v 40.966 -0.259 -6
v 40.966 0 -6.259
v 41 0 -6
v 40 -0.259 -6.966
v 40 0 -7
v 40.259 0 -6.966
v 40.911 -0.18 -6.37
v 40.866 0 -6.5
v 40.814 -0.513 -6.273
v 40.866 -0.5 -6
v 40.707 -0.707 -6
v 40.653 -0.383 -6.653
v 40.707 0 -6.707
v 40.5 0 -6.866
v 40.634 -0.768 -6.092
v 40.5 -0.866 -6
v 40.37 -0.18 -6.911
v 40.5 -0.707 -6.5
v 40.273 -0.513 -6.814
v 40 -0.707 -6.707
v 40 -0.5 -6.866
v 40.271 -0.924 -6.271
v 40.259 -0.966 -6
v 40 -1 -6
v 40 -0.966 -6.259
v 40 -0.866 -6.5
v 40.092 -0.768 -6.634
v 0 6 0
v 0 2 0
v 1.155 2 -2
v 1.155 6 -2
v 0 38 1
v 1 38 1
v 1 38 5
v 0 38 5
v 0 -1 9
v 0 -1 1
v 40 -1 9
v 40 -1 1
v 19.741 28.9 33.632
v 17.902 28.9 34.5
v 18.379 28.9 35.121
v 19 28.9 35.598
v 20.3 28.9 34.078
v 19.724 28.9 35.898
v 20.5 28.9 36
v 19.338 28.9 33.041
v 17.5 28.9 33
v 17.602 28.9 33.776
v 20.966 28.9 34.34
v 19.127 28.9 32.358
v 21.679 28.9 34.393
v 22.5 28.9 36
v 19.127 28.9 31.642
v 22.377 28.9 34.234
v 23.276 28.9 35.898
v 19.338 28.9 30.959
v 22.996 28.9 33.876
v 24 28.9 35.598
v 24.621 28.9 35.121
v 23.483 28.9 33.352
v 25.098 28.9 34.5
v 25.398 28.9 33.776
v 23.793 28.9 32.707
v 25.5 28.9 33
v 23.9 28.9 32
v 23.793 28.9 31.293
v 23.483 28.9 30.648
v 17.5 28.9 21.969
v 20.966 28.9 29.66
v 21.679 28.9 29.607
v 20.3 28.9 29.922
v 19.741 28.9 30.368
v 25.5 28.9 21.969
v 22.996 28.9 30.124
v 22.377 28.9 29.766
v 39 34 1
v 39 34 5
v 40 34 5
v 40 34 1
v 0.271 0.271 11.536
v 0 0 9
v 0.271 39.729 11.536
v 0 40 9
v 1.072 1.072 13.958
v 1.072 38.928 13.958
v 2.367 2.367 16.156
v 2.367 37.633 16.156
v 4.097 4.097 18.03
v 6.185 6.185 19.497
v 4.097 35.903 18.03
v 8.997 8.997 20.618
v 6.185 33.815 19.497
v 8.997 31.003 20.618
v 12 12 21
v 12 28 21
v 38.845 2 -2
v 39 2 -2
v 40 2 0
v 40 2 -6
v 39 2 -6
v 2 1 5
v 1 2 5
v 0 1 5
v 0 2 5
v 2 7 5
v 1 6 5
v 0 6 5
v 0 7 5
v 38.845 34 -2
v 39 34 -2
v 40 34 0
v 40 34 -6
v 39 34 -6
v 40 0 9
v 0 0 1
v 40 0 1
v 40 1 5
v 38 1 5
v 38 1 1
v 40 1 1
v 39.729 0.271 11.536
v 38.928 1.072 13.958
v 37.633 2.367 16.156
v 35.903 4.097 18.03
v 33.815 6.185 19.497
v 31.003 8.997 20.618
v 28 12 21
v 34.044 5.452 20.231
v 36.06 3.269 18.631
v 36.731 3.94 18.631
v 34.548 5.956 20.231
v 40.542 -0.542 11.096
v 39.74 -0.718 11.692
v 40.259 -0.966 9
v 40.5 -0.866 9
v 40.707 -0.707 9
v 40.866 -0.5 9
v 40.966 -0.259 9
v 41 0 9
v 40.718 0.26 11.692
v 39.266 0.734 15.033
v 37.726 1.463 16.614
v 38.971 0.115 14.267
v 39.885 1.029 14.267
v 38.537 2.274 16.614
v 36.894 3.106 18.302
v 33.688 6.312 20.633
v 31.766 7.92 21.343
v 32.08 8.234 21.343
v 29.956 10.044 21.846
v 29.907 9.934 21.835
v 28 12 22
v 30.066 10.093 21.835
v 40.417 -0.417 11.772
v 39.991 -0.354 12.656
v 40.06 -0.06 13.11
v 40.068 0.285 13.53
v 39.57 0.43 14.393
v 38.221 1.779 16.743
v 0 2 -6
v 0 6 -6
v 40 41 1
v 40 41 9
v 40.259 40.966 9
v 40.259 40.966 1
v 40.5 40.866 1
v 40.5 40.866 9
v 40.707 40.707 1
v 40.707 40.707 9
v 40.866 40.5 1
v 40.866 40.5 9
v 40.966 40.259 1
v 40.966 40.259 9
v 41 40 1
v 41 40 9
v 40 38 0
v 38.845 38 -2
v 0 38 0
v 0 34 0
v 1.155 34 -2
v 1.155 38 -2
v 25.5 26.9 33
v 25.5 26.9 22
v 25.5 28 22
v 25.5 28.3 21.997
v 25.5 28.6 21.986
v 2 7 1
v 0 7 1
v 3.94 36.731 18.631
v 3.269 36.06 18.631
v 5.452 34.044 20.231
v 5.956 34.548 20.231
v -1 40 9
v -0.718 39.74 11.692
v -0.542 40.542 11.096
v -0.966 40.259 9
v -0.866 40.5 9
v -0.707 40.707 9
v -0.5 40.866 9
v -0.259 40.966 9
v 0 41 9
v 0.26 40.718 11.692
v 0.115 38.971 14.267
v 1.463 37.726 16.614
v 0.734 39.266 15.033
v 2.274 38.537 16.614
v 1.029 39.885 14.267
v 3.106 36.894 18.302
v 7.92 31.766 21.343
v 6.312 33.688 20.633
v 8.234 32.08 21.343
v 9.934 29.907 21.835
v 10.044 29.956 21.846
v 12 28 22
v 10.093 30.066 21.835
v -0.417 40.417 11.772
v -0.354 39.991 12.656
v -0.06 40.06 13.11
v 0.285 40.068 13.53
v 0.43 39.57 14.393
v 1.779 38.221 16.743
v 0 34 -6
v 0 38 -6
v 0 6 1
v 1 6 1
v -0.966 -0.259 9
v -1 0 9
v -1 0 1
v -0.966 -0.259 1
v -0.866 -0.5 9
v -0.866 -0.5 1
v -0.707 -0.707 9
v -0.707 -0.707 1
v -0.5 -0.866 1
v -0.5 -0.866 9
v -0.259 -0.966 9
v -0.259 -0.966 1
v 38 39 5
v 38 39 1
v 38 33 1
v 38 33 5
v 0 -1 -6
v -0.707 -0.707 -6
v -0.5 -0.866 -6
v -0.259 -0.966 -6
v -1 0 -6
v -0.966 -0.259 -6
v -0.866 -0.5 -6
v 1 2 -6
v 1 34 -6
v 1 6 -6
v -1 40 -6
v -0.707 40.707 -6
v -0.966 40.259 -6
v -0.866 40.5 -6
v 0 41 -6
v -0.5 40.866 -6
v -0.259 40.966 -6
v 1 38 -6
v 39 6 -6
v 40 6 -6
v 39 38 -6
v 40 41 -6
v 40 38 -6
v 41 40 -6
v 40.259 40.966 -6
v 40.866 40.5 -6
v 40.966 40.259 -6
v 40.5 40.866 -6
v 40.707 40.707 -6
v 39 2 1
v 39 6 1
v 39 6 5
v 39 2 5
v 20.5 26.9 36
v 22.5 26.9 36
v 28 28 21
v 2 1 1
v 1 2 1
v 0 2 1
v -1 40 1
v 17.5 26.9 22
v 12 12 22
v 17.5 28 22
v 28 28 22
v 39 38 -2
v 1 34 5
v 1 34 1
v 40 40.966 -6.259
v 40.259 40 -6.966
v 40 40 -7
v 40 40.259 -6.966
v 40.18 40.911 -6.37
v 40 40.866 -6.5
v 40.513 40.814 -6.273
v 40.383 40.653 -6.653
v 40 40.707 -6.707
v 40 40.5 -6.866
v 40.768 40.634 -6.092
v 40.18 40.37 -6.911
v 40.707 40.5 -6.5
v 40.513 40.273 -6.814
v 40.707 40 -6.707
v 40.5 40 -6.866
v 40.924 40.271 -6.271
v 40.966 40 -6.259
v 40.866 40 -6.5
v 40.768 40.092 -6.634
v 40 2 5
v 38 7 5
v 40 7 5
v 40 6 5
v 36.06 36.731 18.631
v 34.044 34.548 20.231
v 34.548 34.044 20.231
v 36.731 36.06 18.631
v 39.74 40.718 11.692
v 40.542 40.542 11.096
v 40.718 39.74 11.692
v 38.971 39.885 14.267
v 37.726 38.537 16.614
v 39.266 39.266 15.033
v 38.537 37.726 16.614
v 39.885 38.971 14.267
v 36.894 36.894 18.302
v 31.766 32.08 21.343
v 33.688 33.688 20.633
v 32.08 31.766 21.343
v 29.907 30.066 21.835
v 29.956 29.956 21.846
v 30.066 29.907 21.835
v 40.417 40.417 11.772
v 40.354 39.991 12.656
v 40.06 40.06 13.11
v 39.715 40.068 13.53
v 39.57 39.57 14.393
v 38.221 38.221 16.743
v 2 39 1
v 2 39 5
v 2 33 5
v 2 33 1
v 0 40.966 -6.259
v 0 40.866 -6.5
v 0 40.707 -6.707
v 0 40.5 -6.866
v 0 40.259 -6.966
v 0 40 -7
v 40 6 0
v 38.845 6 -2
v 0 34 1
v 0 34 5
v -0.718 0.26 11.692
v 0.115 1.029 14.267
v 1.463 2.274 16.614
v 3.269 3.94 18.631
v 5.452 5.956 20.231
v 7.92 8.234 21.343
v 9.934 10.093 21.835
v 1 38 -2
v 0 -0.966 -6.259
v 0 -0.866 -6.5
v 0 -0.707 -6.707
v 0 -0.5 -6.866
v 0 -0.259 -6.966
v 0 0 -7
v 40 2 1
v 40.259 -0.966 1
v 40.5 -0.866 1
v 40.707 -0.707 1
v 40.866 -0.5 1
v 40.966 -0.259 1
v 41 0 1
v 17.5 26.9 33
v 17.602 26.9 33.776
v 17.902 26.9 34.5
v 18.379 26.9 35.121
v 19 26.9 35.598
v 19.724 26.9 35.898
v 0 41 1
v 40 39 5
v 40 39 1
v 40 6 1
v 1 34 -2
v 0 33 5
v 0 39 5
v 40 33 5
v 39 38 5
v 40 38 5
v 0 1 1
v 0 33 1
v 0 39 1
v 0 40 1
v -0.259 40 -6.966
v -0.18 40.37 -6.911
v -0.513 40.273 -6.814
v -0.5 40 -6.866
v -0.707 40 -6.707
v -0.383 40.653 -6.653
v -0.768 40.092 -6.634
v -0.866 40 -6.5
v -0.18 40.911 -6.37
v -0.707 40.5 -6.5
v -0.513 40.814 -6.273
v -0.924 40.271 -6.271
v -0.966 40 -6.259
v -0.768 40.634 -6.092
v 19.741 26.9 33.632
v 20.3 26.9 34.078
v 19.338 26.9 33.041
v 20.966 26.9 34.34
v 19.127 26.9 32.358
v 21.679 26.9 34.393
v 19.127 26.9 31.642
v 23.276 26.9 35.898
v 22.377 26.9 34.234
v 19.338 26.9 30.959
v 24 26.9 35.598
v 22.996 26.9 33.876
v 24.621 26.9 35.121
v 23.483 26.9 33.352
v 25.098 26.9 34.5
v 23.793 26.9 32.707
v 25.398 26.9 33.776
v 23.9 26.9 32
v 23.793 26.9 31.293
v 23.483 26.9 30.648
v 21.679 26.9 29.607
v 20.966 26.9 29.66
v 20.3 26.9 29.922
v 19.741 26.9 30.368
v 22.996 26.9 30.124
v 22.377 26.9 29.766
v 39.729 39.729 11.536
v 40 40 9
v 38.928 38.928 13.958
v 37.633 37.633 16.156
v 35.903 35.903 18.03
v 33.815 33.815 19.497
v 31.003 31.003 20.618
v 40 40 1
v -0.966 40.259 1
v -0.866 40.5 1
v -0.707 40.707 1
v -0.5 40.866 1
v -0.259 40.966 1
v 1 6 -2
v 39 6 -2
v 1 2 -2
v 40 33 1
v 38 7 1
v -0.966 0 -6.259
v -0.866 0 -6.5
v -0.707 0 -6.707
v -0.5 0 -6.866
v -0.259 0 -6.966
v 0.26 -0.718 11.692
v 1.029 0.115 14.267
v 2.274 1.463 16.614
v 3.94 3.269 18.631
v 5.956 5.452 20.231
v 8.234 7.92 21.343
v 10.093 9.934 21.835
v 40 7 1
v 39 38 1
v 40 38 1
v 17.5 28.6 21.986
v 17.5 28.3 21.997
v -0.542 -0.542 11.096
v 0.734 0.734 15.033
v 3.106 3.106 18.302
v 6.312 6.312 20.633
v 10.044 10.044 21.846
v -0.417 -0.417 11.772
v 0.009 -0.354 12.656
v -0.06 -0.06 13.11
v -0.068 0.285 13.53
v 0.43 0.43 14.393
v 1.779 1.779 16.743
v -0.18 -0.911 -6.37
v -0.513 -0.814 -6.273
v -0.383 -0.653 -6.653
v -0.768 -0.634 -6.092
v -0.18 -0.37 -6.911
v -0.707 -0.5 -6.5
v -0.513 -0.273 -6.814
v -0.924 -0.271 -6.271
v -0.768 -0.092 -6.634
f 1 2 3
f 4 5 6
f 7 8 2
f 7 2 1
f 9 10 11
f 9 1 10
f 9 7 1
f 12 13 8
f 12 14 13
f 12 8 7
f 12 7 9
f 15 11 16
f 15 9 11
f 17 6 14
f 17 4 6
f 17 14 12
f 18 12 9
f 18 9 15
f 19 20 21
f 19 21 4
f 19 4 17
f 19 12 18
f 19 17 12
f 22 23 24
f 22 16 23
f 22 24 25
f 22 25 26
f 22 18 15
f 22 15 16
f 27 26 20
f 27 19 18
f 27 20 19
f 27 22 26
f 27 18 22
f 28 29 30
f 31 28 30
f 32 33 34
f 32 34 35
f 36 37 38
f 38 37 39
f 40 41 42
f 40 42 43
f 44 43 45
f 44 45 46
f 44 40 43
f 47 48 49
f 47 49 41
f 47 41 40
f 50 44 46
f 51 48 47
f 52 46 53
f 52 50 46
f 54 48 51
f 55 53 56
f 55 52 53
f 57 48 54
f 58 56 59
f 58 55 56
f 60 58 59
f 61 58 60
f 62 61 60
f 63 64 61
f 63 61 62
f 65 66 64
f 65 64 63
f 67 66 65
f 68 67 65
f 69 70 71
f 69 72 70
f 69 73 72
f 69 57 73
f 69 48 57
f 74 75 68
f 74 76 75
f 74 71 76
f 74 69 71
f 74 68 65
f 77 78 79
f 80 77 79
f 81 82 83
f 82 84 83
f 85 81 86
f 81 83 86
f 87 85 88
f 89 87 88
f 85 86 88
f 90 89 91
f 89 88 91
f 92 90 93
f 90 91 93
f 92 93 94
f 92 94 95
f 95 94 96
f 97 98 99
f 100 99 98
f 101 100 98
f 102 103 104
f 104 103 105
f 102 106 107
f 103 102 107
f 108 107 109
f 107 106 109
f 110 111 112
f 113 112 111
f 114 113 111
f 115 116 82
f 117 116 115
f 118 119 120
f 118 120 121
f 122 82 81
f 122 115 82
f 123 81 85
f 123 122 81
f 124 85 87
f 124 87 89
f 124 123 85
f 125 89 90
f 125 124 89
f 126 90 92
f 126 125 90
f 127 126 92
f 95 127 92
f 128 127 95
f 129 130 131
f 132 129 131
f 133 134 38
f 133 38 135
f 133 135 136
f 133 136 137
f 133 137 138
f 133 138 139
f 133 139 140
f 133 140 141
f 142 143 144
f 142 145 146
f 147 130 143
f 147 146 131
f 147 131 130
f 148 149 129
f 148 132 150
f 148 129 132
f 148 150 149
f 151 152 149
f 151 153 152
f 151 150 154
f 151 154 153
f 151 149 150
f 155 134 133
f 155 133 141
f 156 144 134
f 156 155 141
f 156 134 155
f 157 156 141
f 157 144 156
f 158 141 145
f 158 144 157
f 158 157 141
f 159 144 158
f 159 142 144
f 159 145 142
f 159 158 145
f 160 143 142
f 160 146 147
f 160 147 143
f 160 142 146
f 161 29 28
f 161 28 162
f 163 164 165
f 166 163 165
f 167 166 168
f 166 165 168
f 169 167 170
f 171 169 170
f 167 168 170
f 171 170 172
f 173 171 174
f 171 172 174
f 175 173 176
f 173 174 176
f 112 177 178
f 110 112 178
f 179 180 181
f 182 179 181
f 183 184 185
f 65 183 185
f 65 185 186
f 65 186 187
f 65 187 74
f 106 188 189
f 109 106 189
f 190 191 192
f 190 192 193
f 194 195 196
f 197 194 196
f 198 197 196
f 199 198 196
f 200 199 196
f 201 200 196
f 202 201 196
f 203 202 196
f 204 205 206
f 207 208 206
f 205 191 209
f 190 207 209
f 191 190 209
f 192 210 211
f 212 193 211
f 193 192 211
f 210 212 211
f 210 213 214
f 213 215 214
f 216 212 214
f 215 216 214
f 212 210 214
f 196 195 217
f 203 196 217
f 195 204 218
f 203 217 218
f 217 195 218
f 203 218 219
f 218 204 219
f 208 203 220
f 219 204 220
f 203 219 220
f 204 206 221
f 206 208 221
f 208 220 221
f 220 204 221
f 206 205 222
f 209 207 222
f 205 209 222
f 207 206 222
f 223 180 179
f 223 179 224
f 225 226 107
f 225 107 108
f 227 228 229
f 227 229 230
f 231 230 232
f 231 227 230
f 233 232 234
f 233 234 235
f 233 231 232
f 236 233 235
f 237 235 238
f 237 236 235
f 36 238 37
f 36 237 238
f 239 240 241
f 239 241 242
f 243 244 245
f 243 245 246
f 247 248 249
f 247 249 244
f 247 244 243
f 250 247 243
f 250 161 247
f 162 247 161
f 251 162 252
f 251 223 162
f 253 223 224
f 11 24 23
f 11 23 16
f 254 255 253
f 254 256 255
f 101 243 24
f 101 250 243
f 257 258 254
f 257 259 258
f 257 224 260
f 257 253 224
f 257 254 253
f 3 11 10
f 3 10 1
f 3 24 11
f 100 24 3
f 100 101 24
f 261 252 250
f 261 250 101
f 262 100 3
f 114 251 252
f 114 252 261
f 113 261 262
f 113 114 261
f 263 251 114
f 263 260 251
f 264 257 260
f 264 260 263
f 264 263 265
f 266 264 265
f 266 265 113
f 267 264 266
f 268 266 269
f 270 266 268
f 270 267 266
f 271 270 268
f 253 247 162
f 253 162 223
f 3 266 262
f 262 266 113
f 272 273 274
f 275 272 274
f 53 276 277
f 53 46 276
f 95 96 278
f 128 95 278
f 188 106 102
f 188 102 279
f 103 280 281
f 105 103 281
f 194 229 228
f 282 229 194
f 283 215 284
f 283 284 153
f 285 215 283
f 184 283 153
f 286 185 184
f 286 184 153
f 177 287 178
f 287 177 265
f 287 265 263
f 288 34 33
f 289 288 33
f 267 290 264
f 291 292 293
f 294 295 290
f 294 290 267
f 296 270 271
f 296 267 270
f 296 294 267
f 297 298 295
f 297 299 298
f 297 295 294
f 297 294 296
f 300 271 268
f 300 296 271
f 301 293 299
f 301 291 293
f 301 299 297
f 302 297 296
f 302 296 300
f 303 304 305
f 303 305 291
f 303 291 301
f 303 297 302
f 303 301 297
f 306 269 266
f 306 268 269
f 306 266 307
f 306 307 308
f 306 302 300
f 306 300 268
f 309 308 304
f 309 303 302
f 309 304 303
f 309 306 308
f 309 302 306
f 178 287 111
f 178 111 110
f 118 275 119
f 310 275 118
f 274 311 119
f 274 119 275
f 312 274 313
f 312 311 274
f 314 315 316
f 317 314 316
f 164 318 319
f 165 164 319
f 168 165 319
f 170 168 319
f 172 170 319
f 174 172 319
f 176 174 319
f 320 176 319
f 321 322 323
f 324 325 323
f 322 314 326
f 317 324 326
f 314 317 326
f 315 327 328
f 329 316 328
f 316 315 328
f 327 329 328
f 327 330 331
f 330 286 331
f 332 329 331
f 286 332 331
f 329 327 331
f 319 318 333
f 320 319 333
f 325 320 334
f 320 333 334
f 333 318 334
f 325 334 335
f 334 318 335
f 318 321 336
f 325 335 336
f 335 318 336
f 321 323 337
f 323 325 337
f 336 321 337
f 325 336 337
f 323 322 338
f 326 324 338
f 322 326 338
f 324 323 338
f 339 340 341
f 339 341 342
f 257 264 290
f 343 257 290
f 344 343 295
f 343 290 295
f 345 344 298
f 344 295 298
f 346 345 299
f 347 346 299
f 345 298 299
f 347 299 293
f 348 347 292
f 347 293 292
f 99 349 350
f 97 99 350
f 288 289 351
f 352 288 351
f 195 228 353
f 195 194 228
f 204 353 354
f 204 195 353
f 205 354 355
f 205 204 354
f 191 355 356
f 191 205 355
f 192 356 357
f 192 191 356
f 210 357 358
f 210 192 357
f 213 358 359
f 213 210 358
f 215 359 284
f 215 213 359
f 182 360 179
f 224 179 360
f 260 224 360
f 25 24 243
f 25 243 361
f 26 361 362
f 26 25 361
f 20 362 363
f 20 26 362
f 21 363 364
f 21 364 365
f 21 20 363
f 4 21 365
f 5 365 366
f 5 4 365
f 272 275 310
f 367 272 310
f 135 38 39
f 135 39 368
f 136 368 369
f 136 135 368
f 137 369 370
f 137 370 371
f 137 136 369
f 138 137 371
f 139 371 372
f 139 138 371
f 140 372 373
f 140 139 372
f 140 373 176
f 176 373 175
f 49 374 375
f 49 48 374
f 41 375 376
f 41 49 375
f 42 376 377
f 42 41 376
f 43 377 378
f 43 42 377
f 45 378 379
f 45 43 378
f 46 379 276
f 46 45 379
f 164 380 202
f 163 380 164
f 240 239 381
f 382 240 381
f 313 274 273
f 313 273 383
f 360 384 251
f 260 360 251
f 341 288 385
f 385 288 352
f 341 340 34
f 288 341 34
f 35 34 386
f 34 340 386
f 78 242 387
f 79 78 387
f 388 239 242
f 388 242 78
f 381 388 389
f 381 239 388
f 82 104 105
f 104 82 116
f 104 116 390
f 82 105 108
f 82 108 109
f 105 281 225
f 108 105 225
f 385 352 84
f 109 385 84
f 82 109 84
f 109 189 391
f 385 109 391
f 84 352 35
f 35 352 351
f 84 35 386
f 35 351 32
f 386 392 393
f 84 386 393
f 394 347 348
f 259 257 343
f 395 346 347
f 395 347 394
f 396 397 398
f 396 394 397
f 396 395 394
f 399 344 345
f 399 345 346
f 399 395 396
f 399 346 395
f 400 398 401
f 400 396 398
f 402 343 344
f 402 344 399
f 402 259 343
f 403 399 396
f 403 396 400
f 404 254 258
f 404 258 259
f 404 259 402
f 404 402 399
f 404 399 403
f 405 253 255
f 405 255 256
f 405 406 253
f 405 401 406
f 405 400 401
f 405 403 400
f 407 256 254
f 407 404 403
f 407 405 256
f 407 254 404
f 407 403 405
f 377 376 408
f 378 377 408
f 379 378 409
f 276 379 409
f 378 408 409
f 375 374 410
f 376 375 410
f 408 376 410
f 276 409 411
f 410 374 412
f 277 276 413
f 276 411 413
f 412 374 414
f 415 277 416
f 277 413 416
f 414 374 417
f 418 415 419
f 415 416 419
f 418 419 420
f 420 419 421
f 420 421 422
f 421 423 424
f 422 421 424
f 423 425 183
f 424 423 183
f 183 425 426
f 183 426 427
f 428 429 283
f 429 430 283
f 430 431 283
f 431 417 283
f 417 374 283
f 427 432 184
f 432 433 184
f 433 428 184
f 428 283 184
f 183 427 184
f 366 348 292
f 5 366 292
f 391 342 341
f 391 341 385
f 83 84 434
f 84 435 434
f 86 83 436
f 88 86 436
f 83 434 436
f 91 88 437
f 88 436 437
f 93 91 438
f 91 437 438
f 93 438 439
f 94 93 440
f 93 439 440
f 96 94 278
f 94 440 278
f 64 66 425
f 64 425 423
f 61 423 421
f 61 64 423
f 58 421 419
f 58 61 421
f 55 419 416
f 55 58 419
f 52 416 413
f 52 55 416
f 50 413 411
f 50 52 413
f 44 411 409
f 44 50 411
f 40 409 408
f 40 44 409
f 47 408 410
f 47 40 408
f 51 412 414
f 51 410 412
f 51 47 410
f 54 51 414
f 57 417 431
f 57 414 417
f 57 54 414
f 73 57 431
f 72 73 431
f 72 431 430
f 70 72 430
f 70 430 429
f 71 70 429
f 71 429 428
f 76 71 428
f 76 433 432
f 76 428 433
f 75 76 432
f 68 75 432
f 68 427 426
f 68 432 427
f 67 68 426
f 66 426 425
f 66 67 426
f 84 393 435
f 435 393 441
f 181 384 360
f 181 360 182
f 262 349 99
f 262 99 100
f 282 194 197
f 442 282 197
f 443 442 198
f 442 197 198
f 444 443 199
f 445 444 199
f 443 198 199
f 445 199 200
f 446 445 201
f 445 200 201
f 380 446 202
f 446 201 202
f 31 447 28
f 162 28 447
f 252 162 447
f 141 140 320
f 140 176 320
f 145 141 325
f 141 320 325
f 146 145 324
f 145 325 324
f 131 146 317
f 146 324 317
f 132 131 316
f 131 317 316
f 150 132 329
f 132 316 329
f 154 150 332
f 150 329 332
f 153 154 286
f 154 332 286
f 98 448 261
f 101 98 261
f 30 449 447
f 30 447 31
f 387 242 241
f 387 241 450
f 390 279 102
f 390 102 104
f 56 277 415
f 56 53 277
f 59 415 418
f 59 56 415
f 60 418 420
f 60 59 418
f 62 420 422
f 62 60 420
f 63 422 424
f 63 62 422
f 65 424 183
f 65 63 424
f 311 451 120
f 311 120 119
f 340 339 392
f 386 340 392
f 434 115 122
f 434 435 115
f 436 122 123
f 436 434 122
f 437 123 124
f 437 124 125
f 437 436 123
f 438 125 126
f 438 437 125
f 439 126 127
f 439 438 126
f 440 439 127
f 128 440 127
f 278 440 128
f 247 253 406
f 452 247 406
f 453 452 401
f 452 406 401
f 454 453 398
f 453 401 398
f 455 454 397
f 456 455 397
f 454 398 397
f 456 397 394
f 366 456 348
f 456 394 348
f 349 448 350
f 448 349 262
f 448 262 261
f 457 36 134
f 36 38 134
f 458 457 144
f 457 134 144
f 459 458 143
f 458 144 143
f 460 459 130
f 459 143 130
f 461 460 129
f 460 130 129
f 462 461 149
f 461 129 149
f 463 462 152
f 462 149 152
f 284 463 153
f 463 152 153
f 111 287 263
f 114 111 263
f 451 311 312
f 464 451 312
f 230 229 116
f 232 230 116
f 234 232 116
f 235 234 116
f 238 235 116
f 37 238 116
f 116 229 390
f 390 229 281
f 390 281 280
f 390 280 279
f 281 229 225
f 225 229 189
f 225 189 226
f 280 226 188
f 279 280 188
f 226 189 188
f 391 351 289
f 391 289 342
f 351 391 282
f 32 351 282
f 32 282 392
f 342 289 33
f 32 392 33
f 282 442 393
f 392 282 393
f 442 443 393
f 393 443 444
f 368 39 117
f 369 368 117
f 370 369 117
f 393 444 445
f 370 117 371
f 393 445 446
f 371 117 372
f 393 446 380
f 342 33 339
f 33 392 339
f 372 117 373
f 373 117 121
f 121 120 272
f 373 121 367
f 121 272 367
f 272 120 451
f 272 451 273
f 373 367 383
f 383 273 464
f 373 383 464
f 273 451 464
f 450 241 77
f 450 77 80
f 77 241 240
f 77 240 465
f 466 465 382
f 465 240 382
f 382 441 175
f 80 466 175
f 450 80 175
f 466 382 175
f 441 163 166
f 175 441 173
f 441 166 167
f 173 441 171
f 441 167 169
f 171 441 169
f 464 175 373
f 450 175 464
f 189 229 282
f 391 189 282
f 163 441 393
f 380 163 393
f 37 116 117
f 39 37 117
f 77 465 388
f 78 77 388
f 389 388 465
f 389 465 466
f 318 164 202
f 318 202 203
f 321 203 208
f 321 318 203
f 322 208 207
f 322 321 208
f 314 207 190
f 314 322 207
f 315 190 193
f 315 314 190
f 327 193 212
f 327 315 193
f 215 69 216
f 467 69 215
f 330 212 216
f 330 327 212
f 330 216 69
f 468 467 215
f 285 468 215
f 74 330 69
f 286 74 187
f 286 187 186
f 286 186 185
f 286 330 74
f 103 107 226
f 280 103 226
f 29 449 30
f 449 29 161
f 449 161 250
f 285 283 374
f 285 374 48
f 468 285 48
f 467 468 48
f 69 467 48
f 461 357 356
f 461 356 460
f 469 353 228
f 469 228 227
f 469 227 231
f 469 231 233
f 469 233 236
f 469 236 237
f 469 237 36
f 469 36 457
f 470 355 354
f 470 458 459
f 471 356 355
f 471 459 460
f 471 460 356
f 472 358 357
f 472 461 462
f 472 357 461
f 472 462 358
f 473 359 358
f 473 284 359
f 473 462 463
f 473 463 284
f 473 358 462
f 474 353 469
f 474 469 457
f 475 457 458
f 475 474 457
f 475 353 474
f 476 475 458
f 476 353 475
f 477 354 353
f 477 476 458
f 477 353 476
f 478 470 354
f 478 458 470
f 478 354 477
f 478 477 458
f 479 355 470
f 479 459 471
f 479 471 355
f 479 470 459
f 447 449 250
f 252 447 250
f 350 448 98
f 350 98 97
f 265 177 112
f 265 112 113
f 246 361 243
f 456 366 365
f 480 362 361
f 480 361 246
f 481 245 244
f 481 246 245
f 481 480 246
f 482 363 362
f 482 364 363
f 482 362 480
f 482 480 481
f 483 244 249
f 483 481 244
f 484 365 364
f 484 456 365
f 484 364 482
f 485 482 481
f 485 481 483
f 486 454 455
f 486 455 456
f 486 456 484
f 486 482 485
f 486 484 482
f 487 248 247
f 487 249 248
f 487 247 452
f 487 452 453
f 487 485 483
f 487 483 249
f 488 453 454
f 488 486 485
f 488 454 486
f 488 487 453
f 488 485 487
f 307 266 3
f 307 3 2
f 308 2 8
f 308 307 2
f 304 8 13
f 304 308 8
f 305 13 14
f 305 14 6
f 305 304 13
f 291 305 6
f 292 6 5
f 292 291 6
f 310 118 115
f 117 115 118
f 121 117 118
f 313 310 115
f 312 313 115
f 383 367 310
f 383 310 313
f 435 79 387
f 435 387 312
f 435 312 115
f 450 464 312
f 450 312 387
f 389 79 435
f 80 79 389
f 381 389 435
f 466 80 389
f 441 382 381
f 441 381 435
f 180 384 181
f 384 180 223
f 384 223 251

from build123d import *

# Parameters (mm, degrees)
BOX056_W               = 40
BOX056_H               = 40
BOX056_DEPTH           = 20
FILLET007_R            = 12
THICKNESS008_T         = 1
BOX064_W               = 1
BOX064_H               = 4
BOX064_DEPTH           = 4
BOX063_W               = 2
BOX063_H               = 4
BOX063_DEPTH           = 6
CUT027_ROLL_ANGLE      = -90
CUT027_PLACEMENT_ANGLE = 180
BOX062_W               = 1
BOX062_H               = 4
BOX062_DEPTH           = 4
BOX061_W               = 2
BOX061_H               = 4
BOX061_DEPTH           = 6
CUT026_ROLL_ANGLE      = -90
CUT026_PLACEMENT_ANGLE = 180
BOX060_W               = 1
BOX060_H               = 4
BOX060_DEPTH           = 4
BOX059_W               = 2
BOX059_H               = 4
BOX059_DEPTH           = 6
CUT025_PLACEMENT_ANGLE = 90
BOX058_W               = 1
BOX058_H               = 4
BOX058_DEPTH           = 4
BOX057_W               = 2
BOX057_H               = 4
BOX057_DEPTH           = 6
CUT024_PLACEMENT_ANGLE = 90
CYLINDER014_R          = 2.4
CYLINDER014_DEPTH      = 10
BOX053_W               = 8
BOX053_H               = 2
BOX053_DEPTH           = 15
FILLET005_R            = 3
BOX066_W               = 2
BOX066_H               = 3
BOX066_DEPTH           = 4
BOX066_PLACEMENT_ANGLE = 30
BOX068_W               = 1.2
BOX068_H               = 2
BOX068_DEPTH           = 4
BOX067_W               = 1
BOX067_H               = 6
BOX067_DEPTH           = 4
CUT028_PLACEMENT_ANGLE = 90
BOX069_W               = 2
BOX069_H               = 3
BOX069_DEPTH           = 4
BOX069_PLACEMENT_ANGLE = 30
BOX071_W               = 1.2
BOX071_H               = 2
BOX071_DEPTH           = 4
BOX070_W               = 1
BOX070_H               = 6
BOX070_DEPTH           = 4
CUT029_PLACEMENT_ANGLE = 90
BOX072_W               = 2
BOX072_H               = 3
BOX072_DEPTH           = 4
BOX072_PLACEMENT_ANGLE = 30
BOX074_W               = 1.2
BOX074_H               = 2
BOX074_DEPTH           = 4
BOX073_W               = 1
BOX073_H               = 6
BOX073_DEPTH           = 4
CUT030_ROLL_ANGLE      = -90
CUT030_PLACEMENT_ANGLE = 180
BOX075_W               = 2
BOX075_H               = 3
BOX075_DEPTH           = 4
BOX075_PLACEMENT_ANGLE = 30
BOX077_W               = 1.2
BOX077_H               = 2
BOX077_DEPTH           = 4
BOX076_W               = 1
BOX076_H               = 6
BOX076_DEPTH           = 4
CUT031_ROLL_ANGLE      = -90
CUT031_PLACEMENT_ANGLE = 180
BOX065_W               = 40
BOX065_H               = 40
BOX065_DEPTH           = 20
THICKNESS007_T         = 1
BOX055_W               = 42
BOX055_H               = 42
BOX055_DEPTH           = 1


with BuildPart() as thickness008:
    # Box056 → Box056 (new body)
    with BuildSketch(Plane.XY):
        with Locations((20, 20)):
            Rectangle(BOX056_W, BOX056_H)
    extrude(amount=BOX056_DEPTH)

    # Fillet007
    fillet007_edges = [thickness008.edges().sort_by_distance(p)[0] for p in [
        (0, 20, 20),
        (40, 20, 20),
        (20, 0, 20),
        (20, 40, 20),
    ]]
    fillet(fillet007_edges, radius=FILLET007_R)


with BuildPart() as thickness008_1:
    # Fillet007 placement: moved
    add(thickness008.part.moved(Location((0, 0, 1))))

    # Thickness008
    thickness008_openings = [thickness008_1.faces().sort_by_distance(p)[0] for p in [
        (20, 20, 1),
    ]]
    offset(amount=THICKNESS008_T, openings=thickness008_openings)


with BuildPart() as cube045:
    # Box064 → Box064 (new body)
    with BuildSketch(Plane(origin=(1, 0, 1), x_dir=(1, 0, 0), z_dir=(0, 0, 1))):
        with Locations((0.5, 2)):
            Rectangle(BOX064_W, BOX064_H)
    extrude(amount=BOX064_DEPTH)


with BuildPart() as cut027:
    # Box063 → Box063 (new body)
    with BuildSketch(Plane.XY):
        with Locations((1, 2)):
            Rectangle(BOX063_W, BOX063_H)
    extrude(amount=BOX063_DEPTH)

    # Cut027: cut Cube045
    add(cube045.part, mode=Mode.SUBTRACT)


with BuildPart() as cut027_1:
    # Cut027 roll: moved
    add(cut027.part.rotate(Axis((0, 0, 0), (1, 0, 0)), CUT027_ROLL_ANGLE))


with BuildPart() as cut027_2:
    # Cut027 placement: moved
    add(cut027_1.part.moved(Location((2, 39, 5))).rotate(Axis((2, 39, 5), (0, 0, 1)), CUT027_PLACEMENT_ANGLE))


with BuildPart() as cube043:
    # Box062 → Box062 (new body)
    with BuildSketch(Plane(origin=(1, 0, 1), x_dir=(1, 0, 0), z_dir=(0, 0, 1))):
        with Locations((0.5, 2)):
            Rectangle(BOX062_W, BOX062_H)
    extrude(amount=BOX062_DEPTH)


with BuildPart() as cut026:
    # Box061 → Box061 (new body)
    with BuildSketch(Plane.XY):
        with Locations((1, 2)):
            Rectangle(BOX061_W, BOX061_H)
    extrude(amount=BOX061_DEPTH)

    # Cut026: cut Cube043
    add(cube043.part, mode=Mode.SUBTRACT)


with BuildPart() as cut026_1:
    # Cut026 roll: moved
    add(cut026.part.rotate(Axis((0, 0, 0), (1, 0, 0)), CUT026_ROLL_ANGLE))


with BuildPart() as cut026_2:
    # Cut026 placement: moved
    add(cut026_1.part.moved(Location((2, 7, 5))).rotate(Axis((2, 7, 5), (0, 0, 1)), CUT026_PLACEMENT_ANGLE))


with BuildPart() as cube041:
    # Box060 → Box060 (new body)
    with BuildSketch(Plane(origin=(1, 0, 1), x_dir=(1, 0, 0), z_dir=(0, 0, 1))):
        with Locations((0.5, 2)):
            Rectangle(BOX060_W, BOX060_H)
    extrude(amount=BOX060_DEPTH)


with BuildPart() as cut025:
    # Box059 → Box059 (new body)
    with BuildSketch(Plane.XY):
        with Locations((1, 2)):
            Rectangle(BOX059_W, BOX059_H)
    extrude(amount=BOX059_DEPTH)

    # Cut025: cut Cube041
    add(cube041.part, mode=Mode.SUBTRACT)


with BuildPart() as cut025_1:
    # Cut025 placement: moved
    add(cut025.part.moved(Location((38, 39, 1))).rotate(Axis((38, 39, 1), (1, 0, 0)), CUT025_PLACEMENT_ANGLE))


with BuildPart() as cube039:
    # Box058 → Box058 (new body)
    with BuildSketch(Plane(origin=(1, 0, 1), x_dir=(1, 0, 0), z_dir=(0, 0, 1))):
        with Locations((0.5, 2)):
            Rectangle(BOX058_W, BOX058_H)
    extrude(amount=BOX058_DEPTH)


with BuildPart() as cut024:
    # Box057 → Box057 (new body)
    with BuildSketch(Plane.XY):
        with Locations((1, 2)):
            Rectangle(BOX057_W, BOX057_H)
    extrude(amount=BOX057_DEPTH)

    # Cut024: cut Cube039
    add(cube039.part, mode=Mode.SUBTRACT)


with BuildPart() as cut024_1:
    # Cut024 placement: moved
    add(cut024.part.moved(Location((38, 7, 1))).rotate(Axis((38, 7, 1), (1, 0, 0)), CUT024_PLACEMENT_ANGLE))


with BuildPart() as cylindre014:
    # Cylinder014 → Cylinder014 (new body)
    with BuildSketch(Plane(origin=(4, 4, 11), x_dir=(1, 0, 0), z_dir=(0, -1, 0))):
        Circle(CYLINDER014_R)
    extrude(amount=CYLINDER014_DEPTH)


with BuildPart() as paw_body:
    # Box053 → Box053 (new body)
    with BuildSketch(Plane.XY):
        with Locations((4, 1)):
            Rectangle(BOX053_W, BOX053_H)
    extrude(amount=BOX053_DEPTH)

    # Cut022: cut Cylindre014
    add(cylindre014.part, mode=Mode.SUBTRACT)


with BuildPart() as paw_body_1:
    # Cut022 placement: moved
    add(paw_body.part.moved(Location((17.5, 26.9, 86))))

    # Fillet005
    fillet005_edges = [paw_body_1.edges().sort_by_distance(p)[0] for p in [
        (17.5, 27.9, 101),
        (25.5, 27.9, 101),
    ]]
    fillet(fillet005_edges, radius=FILLET005_R)


with BuildPart() as paw_body_2:
    # Fillet005 placement: moved
    add(paw_body_1.part.moved(Location((0, 0, -65))))

    # Fusion021: union Thickness008, Cut027, Cut026, Cut025, Cut024
    add(thickness008_1.part)
    add(cut027_2.part)
    add(cut026_2.part)
    add(cut025_1.part)
    add(cut024_1.part)


with BuildPart() as cube046:
    # Box066 → Box066 (new body)
    with BuildSketch(Plane.XY):
        with Locations((1, 1.5)):
            Rectangle(BOX066_W, BOX066_H)
    extrude(amount=BOX066_DEPTH)


with BuildPart() as cube046_1:
    # Box066 placement: moved
    add(cube046.part.moved(Location((1, 0, 1))).rotate(Axis((1, 0, 1), (0, 0, -1)), BOX066_PLACEMENT_ANGLE))


with BuildPart() as cube048:
    # Box068 → Box068 (new body)
    with BuildSketch(Plane(origin=(1, 0, 1), x_dir=(1, 0, 0), z_dir=(0, 0, 1))):
        with Locations((0.6, 1)):
            Rectangle(BOX068_W, BOX068_H)
    extrude(amount=BOX068_DEPTH)


with BuildPart() as cut028:
    # Box067 → Box067 (new body)
    with BuildSketch(Plane(origin=(1, 0, 1), x_dir=(1, 0, 0), z_dir=(0, 0, 1))):
        with Locations((0.5, 3)):
            Rectangle(BOX067_W, BOX067_H)
    extrude(amount=BOX067_DEPTH)

    # Fusion022: union Cube048
    add(cube048.part)

    # Cut028: cut Cube046
    add(cube046_1.part, mode=Mode.SUBTRACT)


with BuildPart() as cut028_1:
    # Cut028 placement: moved
    add(cut028.part.moved(Location((-1, 1, 0))).rotate(Axis((-1, 1, 0), (-1, 0, 0)), CUT028_PLACEMENT_ANGLE))


with BuildPart() as cube049:
    # Box069 → Box069 (new body)
    with BuildSketch(Plane.XY):
        with Locations((1, 1.5)):
            Rectangle(BOX069_W, BOX069_H)
    extrude(amount=BOX069_DEPTH)


with BuildPart() as cube049_1:
    # Box069 placement: moved
    add(cube049.part.moved(Location((1, 0, 1))).rotate(Axis((1, 0, 1), (0, 0, -1)), BOX069_PLACEMENT_ANGLE))


with BuildPart() as cube051:
    # Box071 → Box071 (new body)
    with BuildSketch(Plane(origin=(1, 0, 1), x_dir=(1, 0, 0), z_dir=(0, 0, 1))):
        with Locations((0.6, 1)):
            Rectangle(BOX071_W, BOX071_H)
    extrude(amount=BOX071_DEPTH)


with BuildPart() as cut029:
    # Box070 → Box070 (new body)
    with BuildSketch(Plane(origin=(1, 0, 1), x_dir=(1, 0, 0), z_dir=(0, 0, 1))):
        with Locations((0.5, 3)):
            Rectangle(BOX070_W, BOX070_H)
    extrude(amount=BOX070_DEPTH)

    # Fusion023: union Cube051
    add(cube051.part)

    # Cut029: cut Cube049
    add(cube049_1.part, mode=Mode.SUBTRACT)


with BuildPart() as cut029_1:
    # Cut029 placement: moved
    add(cut029.part.moved(Location((-1, 33, 0))).rotate(Axis((-1, 33, 0), (-1, 0, 0)), CUT029_PLACEMENT_ANGLE))


with BuildPart() as cube052:
    # Box072 → Box072 (new body)
    with BuildSketch(Plane.XY):
        with Locations((1, 1.5)):
            Rectangle(BOX072_W, BOX072_H)
    extrude(amount=BOX072_DEPTH)


with BuildPart() as cube052_1:
    # Box072 placement: moved
    add(cube052.part.moved(Location((1, 0, 1))).rotate(Axis((1, 0, 1), (0, 0, -1)), BOX072_PLACEMENT_ANGLE))


with BuildPart() as cube054:
    # Box074 → Box074 (new body)
    with BuildSketch(Plane(origin=(1, 0, 1), x_dir=(1, 0, 0), z_dir=(0, 0, 1))):
        with Locations((0.6, 1)):
            Rectangle(BOX074_W, BOX074_H)
    extrude(amount=BOX074_DEPTH)


with BuildPart() as cut030:
    # Box073 → Box073 (new body)
    with BuildSketch(Plane(origin=(1, 0, 1), x_dir=(1, 0, 0), z_dir=(0, 0, 1))):
        with Locations((0.5, 3)):
            Rectangle(BOX073_W, BOX073_H)
    extrude(amount=BOX073_DEPTH)

    # Fusion024: union Cube054
    add(cube054.part)

    # Cut030: cut Cube052
    add(cube052_1.part, mode=Mode.SUBTRACT)


with BuildPart() as cut030_1:
    # Cut030 roll: moved
    add(cut030.part.rotate(Axis((0, 0, 0), (1, 0, 0)), CUT030_ROLL_ANGLE))


with BuildPart() as cut030_2:
    # Cut030 placement: moved
    add(cut030_1.part.moved(Location((41, 7, 0))).rotate(Axis((41, 7, 0), (0, 0, 1)), CUT030_PLACEMENT_ANGLE))


with BuildPart() as cube055:
    # Box075 → Box075 (new body)
    with BuildSketch(Plane.XY):
        with Locations((1, 1.5)):
            Rectangle(BOX075_W, BOX075_H)
    extrude(amount=BOX075_DEPTH)


with BuildPart() as cube055_1:
    # Box075 placement: moved
    add(cube055.part.moved(Location((1, 0, 1))).rotate(Axis((1, 0, 1), (0, 0, -1)), BOX075_PLACEMENT_ANGLE))


with BuildPart() as cube057:
    # Box077 → Box077 (new body)
    with BuildSketch(Plane(origin=(1, 0, 1), x_dir=(1, 0, 0), z_dir=(0, 0, 1))):
        with Locations((0.6, 1)):
            Rectangle(BOX077_W, BOX077_H)
    extrude(amount=BOX077_DEPTH)


with BuildPart() as cut031:
    # Box076 → Box076 (new body)
    with BuildSketch(Plane(origin=(1, 0, 1), x_dir=(1, 0, 0), z_dir=(0, 0, 1))):
        with Locations((0.5, 3)):
            Rectangle(BOX076_W, BOX076_H)
    extrude(amount=BOX076_DEPTH)

    # Fusion025: union Cube057
    add(cube057.part)

    # Cut031: cut Cube055
    add(cube055_1.part, mode=Mode.SUBTRACT)


with BuildPart() as cut031_1:
    # Cut031 roll: moved
    add(cut031.part.rotate(Axis((0, 0, 0), (1, 0, 0)), CUT031_ROLL_ANGLE))


with BuildPart() as cut031_2:
    # Cut031 placement: moved
    add(cut031_1.part.moved(Location((41, 39, 0))).rotate(Axis((41, 39, 0), (0, 0, 1)), CUT031_PLACEMENT_ANGLE))


with BuildPart() as thickness007:
    # Box065 → Box065 (new body)
    with BuildSketch(Plane.XY):
        with Locations((20, 20)):
            Rectangle(BOX065_W, BOX065_H)
    extrude(amount=BOX065_DEPTH)

    # Thickness007
    thickness007_openings = [thickness007.faces().sort_by_distance(p)[0] for p in [
        (20, 20, 20),
    ]]
    offset(amount=THICKNESS007_T, openings=thickness007_openings)


with BuildPart() as paw_side:
    # Box055 → Box055 (new body)
    with BuildSketch(Plane(origin=(-1, -1, -1), x_dir=(1, 0, 0), z_dir=(0, 0, 1))):
        with Locations((21, 21)):
            Rectangle(BOX055_W, BOX055_H)
    extrude(amount=BOX055_DEPTH)

    # Common001: intersect Thickness007
    add(thickness007.part, mode=Mode.INTERSECT)


with BuildPart() as paw_side_1:
    # Common001 placement: moved
    add(paw_side.part.moved(Location((0, 0, -6))))

    # Fusion026: union Cut028, Cut029, Cut030, Cut031
    add(cut028_1.part)
    add(cut029_1.part)
    add(cut030_2.part)
    add(cut031_2.part)


solid = Compound([paw_body_2.part, paw_side_1.part])
